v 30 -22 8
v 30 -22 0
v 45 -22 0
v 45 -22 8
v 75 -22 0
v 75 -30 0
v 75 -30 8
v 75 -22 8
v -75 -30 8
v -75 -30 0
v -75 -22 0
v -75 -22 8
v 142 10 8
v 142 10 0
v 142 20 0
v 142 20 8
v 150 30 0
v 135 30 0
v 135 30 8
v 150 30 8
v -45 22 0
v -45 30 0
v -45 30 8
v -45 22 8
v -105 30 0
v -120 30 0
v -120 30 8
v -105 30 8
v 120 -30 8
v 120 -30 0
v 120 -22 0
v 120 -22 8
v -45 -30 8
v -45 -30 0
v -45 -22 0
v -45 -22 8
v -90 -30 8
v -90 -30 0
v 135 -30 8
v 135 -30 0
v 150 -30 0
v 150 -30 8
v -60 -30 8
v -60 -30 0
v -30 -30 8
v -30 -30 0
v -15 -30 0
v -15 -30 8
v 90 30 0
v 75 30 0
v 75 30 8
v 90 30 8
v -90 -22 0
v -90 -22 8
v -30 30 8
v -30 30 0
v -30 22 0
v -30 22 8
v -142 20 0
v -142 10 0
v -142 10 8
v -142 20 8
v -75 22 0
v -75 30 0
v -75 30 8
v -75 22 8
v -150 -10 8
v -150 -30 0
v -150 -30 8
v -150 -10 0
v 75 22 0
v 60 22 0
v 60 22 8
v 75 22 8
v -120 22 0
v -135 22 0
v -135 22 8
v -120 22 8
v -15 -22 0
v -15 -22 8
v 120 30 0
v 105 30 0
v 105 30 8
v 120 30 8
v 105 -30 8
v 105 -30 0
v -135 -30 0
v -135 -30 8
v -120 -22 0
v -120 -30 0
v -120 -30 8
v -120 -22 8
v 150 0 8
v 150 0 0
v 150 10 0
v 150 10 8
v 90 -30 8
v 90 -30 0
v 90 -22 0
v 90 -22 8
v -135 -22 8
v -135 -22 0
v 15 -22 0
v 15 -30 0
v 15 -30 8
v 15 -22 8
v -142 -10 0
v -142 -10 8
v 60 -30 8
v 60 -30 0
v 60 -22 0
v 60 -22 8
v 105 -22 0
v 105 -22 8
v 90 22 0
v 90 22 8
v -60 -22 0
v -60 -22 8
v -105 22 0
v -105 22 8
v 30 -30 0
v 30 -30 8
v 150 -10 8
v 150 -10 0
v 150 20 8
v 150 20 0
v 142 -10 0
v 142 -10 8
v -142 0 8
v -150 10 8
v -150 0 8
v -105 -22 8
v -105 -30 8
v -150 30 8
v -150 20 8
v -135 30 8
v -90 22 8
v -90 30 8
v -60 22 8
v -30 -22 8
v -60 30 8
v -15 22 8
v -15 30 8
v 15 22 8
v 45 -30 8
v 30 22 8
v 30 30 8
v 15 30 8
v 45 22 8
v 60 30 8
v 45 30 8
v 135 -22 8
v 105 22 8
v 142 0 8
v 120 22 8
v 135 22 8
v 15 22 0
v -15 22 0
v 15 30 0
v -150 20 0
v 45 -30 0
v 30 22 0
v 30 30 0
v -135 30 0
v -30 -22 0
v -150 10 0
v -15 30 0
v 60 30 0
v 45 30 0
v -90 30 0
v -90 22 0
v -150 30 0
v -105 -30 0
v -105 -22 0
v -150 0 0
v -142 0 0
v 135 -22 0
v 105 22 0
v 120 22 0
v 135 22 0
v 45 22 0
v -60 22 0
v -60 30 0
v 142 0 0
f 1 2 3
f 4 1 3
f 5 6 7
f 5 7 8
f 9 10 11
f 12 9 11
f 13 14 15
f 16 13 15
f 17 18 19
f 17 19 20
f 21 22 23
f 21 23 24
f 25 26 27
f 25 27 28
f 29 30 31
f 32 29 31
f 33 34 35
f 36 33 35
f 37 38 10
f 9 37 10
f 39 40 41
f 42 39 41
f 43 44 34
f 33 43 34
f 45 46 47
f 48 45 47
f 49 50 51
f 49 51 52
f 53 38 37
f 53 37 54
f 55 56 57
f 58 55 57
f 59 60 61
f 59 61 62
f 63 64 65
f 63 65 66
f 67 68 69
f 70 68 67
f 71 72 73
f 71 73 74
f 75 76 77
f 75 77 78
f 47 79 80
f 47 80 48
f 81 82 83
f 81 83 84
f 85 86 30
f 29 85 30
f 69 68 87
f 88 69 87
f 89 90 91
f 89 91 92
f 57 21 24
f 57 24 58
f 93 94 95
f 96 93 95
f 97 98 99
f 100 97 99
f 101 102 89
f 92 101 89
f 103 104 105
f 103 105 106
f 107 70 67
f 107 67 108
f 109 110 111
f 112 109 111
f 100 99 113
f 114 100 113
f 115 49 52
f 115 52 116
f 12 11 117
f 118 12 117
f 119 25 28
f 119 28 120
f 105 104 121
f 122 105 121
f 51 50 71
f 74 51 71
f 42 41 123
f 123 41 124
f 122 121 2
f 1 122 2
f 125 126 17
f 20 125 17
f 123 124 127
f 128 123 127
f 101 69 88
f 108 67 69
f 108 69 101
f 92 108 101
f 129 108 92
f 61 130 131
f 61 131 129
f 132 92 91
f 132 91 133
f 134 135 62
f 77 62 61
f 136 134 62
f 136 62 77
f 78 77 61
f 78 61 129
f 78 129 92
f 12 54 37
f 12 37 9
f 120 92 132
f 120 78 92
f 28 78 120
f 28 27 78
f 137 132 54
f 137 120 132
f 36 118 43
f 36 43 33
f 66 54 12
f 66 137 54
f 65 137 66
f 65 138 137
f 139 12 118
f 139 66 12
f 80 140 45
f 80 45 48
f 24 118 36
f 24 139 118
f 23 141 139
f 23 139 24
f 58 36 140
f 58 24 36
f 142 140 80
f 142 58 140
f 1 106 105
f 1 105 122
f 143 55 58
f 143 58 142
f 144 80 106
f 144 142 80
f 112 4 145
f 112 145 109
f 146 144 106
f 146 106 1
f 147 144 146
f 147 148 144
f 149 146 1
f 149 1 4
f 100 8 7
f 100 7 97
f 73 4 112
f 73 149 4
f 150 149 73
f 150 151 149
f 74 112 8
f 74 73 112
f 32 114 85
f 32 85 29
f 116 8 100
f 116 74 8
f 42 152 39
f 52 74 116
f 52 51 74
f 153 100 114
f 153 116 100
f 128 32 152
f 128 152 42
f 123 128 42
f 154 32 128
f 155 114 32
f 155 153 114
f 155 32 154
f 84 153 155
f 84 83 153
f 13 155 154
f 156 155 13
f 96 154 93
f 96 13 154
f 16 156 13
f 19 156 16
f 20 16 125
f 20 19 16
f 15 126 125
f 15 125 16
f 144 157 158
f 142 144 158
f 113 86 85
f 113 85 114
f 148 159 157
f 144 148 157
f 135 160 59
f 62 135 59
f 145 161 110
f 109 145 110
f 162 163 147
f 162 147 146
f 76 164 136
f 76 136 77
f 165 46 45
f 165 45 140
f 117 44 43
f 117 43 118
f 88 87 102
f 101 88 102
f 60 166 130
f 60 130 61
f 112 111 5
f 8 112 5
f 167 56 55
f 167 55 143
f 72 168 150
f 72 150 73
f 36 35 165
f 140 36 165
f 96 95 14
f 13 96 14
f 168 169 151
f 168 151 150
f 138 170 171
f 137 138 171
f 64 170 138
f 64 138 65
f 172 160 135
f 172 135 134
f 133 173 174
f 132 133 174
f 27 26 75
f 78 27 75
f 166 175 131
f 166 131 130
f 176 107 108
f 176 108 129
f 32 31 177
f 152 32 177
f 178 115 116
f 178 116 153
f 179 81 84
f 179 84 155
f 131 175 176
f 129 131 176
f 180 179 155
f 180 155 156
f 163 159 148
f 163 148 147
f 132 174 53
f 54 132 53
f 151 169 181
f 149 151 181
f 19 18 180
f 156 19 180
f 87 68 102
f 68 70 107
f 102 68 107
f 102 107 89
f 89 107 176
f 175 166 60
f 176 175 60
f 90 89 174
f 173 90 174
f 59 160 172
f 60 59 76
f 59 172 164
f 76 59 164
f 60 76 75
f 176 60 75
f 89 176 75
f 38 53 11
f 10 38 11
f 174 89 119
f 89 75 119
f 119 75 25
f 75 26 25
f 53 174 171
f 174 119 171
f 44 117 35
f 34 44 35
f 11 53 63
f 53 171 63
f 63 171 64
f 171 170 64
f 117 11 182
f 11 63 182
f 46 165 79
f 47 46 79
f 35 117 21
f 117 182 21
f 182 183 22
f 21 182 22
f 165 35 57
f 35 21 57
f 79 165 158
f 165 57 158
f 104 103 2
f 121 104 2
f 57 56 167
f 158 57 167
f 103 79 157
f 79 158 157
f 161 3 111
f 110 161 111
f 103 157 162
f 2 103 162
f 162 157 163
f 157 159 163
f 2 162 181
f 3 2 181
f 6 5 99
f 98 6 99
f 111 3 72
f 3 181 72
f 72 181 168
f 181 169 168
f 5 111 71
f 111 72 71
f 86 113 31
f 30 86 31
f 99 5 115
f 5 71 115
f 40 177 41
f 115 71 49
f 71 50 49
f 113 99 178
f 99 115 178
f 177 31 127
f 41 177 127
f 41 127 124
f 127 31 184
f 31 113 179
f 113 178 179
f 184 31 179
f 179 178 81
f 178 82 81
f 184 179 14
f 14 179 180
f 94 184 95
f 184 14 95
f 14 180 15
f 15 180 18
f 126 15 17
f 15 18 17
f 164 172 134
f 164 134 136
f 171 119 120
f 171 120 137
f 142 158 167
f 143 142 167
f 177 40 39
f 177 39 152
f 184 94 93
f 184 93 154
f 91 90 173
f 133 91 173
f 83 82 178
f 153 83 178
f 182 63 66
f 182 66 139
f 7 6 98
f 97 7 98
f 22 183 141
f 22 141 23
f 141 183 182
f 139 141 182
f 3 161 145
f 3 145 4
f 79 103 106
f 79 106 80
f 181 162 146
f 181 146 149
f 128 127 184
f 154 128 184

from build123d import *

# Parameters (mm, degrees)
ESQUISSE1_W             = 300
ESQUISSE1_H             = 60
BOSS_EXTRU_1_DEPTH      = 8
ESQUISSE2_W             = 15
ESQUISSE2_H             = 8
ENL_V_MAT_EXTRU_1_DEPTH = 8
ESQUISSE3_W             = 8
ESQUISSE3_H             = 10
ENL_V_MAT_EXTRU_2_DEPTH = 154.179633111


with BuildPart() as part:
    # Esquisse1 → Boss.-Extru.1 (new body)
    with BuildSketch(Plane.XY):
        Rectangle(ESQUISSE1_W, ESQUISSE1_H)
    extrude(amount=BOSS_EXTRU_1_DEPTH)

    # Esquisse2 → Enlèv. mat.-Extru.1 (cut)
    with BuildSketch(Plane.XY):
        Polygon((0, -30), (15, -30), (15, -22), (0, -22), (-15, -22), (-15, -30), align=None)
        with Locations((-127.5, -26)):
            Rectangle(ESQUISSE2_W, ESQUISSE2_H)
        with Locations((-97.5, -26)):
            Rectangle(ESQUISSE2_W, ESQUISSE2_H)
        with Locations((-67.5, -26)):
            Rectangle(ESQUISSE2_W, ESQUISSE2_H)
        with Locations((-37.5, -26)):
            Rectangle(ESQUISSE2_W, ESQUISSE2_H)
        with Locations((127.5, -26)):
            Rectangle(ESQUISSE2_W, ESQUISSE2_H)
        with Locations((97.5, -26)):
            Rectangle(ESQUISSE2_W, ESQUISSE2_H)
        with Locations((67.5, -26)):
            Rectangle(ESQUISSE2_W, ESQUISSE2_H)
        with Locations((37.5, -26)):
            Rectangle(ESQUISSE2_W, ESQUISSE2_H)
    enl_v_mat_extru_1 = extrude(amount=ENL_V_MAT_EXTRU_1_DEPTH, mode=Mode.SUBTRACT)

    # Esquisse3 → Enlèv. mat.-Extru.2 (cut, through all)
    with BuildSketch(Plane.XY):
        with Locations((-146, 15)):
            Rectangle(ESQUISSE3_W, ESQUISSE3_H)
        with Locations((-146, -5)):
            Rectangle(ESQUISSE3_W, ESQUISSE3_H)
    enl_v_mat_extru_2 = extrude(amount=ENL_V_MAT_EXTRU_2_DEPTH, mode=Mode.SUBTRACT)

    # Symétrie1: Enlèv. mat.-Extru.2 across plane
    add(enl_v_mat_extru_2.mirror(Plane(origin=(0, 0, 0), x_dir=(0, 0, 1), z_dir=(1, 0, 0))), mode=Mode.SUBTRACT)

    # Symétrie2: Enlèv. mat.-Extru.1 across plane
    add(enl_v_mat_extru_1.mirror(Plane.ZX), mode=Mode.SUBTRACT)


solid = part.part
